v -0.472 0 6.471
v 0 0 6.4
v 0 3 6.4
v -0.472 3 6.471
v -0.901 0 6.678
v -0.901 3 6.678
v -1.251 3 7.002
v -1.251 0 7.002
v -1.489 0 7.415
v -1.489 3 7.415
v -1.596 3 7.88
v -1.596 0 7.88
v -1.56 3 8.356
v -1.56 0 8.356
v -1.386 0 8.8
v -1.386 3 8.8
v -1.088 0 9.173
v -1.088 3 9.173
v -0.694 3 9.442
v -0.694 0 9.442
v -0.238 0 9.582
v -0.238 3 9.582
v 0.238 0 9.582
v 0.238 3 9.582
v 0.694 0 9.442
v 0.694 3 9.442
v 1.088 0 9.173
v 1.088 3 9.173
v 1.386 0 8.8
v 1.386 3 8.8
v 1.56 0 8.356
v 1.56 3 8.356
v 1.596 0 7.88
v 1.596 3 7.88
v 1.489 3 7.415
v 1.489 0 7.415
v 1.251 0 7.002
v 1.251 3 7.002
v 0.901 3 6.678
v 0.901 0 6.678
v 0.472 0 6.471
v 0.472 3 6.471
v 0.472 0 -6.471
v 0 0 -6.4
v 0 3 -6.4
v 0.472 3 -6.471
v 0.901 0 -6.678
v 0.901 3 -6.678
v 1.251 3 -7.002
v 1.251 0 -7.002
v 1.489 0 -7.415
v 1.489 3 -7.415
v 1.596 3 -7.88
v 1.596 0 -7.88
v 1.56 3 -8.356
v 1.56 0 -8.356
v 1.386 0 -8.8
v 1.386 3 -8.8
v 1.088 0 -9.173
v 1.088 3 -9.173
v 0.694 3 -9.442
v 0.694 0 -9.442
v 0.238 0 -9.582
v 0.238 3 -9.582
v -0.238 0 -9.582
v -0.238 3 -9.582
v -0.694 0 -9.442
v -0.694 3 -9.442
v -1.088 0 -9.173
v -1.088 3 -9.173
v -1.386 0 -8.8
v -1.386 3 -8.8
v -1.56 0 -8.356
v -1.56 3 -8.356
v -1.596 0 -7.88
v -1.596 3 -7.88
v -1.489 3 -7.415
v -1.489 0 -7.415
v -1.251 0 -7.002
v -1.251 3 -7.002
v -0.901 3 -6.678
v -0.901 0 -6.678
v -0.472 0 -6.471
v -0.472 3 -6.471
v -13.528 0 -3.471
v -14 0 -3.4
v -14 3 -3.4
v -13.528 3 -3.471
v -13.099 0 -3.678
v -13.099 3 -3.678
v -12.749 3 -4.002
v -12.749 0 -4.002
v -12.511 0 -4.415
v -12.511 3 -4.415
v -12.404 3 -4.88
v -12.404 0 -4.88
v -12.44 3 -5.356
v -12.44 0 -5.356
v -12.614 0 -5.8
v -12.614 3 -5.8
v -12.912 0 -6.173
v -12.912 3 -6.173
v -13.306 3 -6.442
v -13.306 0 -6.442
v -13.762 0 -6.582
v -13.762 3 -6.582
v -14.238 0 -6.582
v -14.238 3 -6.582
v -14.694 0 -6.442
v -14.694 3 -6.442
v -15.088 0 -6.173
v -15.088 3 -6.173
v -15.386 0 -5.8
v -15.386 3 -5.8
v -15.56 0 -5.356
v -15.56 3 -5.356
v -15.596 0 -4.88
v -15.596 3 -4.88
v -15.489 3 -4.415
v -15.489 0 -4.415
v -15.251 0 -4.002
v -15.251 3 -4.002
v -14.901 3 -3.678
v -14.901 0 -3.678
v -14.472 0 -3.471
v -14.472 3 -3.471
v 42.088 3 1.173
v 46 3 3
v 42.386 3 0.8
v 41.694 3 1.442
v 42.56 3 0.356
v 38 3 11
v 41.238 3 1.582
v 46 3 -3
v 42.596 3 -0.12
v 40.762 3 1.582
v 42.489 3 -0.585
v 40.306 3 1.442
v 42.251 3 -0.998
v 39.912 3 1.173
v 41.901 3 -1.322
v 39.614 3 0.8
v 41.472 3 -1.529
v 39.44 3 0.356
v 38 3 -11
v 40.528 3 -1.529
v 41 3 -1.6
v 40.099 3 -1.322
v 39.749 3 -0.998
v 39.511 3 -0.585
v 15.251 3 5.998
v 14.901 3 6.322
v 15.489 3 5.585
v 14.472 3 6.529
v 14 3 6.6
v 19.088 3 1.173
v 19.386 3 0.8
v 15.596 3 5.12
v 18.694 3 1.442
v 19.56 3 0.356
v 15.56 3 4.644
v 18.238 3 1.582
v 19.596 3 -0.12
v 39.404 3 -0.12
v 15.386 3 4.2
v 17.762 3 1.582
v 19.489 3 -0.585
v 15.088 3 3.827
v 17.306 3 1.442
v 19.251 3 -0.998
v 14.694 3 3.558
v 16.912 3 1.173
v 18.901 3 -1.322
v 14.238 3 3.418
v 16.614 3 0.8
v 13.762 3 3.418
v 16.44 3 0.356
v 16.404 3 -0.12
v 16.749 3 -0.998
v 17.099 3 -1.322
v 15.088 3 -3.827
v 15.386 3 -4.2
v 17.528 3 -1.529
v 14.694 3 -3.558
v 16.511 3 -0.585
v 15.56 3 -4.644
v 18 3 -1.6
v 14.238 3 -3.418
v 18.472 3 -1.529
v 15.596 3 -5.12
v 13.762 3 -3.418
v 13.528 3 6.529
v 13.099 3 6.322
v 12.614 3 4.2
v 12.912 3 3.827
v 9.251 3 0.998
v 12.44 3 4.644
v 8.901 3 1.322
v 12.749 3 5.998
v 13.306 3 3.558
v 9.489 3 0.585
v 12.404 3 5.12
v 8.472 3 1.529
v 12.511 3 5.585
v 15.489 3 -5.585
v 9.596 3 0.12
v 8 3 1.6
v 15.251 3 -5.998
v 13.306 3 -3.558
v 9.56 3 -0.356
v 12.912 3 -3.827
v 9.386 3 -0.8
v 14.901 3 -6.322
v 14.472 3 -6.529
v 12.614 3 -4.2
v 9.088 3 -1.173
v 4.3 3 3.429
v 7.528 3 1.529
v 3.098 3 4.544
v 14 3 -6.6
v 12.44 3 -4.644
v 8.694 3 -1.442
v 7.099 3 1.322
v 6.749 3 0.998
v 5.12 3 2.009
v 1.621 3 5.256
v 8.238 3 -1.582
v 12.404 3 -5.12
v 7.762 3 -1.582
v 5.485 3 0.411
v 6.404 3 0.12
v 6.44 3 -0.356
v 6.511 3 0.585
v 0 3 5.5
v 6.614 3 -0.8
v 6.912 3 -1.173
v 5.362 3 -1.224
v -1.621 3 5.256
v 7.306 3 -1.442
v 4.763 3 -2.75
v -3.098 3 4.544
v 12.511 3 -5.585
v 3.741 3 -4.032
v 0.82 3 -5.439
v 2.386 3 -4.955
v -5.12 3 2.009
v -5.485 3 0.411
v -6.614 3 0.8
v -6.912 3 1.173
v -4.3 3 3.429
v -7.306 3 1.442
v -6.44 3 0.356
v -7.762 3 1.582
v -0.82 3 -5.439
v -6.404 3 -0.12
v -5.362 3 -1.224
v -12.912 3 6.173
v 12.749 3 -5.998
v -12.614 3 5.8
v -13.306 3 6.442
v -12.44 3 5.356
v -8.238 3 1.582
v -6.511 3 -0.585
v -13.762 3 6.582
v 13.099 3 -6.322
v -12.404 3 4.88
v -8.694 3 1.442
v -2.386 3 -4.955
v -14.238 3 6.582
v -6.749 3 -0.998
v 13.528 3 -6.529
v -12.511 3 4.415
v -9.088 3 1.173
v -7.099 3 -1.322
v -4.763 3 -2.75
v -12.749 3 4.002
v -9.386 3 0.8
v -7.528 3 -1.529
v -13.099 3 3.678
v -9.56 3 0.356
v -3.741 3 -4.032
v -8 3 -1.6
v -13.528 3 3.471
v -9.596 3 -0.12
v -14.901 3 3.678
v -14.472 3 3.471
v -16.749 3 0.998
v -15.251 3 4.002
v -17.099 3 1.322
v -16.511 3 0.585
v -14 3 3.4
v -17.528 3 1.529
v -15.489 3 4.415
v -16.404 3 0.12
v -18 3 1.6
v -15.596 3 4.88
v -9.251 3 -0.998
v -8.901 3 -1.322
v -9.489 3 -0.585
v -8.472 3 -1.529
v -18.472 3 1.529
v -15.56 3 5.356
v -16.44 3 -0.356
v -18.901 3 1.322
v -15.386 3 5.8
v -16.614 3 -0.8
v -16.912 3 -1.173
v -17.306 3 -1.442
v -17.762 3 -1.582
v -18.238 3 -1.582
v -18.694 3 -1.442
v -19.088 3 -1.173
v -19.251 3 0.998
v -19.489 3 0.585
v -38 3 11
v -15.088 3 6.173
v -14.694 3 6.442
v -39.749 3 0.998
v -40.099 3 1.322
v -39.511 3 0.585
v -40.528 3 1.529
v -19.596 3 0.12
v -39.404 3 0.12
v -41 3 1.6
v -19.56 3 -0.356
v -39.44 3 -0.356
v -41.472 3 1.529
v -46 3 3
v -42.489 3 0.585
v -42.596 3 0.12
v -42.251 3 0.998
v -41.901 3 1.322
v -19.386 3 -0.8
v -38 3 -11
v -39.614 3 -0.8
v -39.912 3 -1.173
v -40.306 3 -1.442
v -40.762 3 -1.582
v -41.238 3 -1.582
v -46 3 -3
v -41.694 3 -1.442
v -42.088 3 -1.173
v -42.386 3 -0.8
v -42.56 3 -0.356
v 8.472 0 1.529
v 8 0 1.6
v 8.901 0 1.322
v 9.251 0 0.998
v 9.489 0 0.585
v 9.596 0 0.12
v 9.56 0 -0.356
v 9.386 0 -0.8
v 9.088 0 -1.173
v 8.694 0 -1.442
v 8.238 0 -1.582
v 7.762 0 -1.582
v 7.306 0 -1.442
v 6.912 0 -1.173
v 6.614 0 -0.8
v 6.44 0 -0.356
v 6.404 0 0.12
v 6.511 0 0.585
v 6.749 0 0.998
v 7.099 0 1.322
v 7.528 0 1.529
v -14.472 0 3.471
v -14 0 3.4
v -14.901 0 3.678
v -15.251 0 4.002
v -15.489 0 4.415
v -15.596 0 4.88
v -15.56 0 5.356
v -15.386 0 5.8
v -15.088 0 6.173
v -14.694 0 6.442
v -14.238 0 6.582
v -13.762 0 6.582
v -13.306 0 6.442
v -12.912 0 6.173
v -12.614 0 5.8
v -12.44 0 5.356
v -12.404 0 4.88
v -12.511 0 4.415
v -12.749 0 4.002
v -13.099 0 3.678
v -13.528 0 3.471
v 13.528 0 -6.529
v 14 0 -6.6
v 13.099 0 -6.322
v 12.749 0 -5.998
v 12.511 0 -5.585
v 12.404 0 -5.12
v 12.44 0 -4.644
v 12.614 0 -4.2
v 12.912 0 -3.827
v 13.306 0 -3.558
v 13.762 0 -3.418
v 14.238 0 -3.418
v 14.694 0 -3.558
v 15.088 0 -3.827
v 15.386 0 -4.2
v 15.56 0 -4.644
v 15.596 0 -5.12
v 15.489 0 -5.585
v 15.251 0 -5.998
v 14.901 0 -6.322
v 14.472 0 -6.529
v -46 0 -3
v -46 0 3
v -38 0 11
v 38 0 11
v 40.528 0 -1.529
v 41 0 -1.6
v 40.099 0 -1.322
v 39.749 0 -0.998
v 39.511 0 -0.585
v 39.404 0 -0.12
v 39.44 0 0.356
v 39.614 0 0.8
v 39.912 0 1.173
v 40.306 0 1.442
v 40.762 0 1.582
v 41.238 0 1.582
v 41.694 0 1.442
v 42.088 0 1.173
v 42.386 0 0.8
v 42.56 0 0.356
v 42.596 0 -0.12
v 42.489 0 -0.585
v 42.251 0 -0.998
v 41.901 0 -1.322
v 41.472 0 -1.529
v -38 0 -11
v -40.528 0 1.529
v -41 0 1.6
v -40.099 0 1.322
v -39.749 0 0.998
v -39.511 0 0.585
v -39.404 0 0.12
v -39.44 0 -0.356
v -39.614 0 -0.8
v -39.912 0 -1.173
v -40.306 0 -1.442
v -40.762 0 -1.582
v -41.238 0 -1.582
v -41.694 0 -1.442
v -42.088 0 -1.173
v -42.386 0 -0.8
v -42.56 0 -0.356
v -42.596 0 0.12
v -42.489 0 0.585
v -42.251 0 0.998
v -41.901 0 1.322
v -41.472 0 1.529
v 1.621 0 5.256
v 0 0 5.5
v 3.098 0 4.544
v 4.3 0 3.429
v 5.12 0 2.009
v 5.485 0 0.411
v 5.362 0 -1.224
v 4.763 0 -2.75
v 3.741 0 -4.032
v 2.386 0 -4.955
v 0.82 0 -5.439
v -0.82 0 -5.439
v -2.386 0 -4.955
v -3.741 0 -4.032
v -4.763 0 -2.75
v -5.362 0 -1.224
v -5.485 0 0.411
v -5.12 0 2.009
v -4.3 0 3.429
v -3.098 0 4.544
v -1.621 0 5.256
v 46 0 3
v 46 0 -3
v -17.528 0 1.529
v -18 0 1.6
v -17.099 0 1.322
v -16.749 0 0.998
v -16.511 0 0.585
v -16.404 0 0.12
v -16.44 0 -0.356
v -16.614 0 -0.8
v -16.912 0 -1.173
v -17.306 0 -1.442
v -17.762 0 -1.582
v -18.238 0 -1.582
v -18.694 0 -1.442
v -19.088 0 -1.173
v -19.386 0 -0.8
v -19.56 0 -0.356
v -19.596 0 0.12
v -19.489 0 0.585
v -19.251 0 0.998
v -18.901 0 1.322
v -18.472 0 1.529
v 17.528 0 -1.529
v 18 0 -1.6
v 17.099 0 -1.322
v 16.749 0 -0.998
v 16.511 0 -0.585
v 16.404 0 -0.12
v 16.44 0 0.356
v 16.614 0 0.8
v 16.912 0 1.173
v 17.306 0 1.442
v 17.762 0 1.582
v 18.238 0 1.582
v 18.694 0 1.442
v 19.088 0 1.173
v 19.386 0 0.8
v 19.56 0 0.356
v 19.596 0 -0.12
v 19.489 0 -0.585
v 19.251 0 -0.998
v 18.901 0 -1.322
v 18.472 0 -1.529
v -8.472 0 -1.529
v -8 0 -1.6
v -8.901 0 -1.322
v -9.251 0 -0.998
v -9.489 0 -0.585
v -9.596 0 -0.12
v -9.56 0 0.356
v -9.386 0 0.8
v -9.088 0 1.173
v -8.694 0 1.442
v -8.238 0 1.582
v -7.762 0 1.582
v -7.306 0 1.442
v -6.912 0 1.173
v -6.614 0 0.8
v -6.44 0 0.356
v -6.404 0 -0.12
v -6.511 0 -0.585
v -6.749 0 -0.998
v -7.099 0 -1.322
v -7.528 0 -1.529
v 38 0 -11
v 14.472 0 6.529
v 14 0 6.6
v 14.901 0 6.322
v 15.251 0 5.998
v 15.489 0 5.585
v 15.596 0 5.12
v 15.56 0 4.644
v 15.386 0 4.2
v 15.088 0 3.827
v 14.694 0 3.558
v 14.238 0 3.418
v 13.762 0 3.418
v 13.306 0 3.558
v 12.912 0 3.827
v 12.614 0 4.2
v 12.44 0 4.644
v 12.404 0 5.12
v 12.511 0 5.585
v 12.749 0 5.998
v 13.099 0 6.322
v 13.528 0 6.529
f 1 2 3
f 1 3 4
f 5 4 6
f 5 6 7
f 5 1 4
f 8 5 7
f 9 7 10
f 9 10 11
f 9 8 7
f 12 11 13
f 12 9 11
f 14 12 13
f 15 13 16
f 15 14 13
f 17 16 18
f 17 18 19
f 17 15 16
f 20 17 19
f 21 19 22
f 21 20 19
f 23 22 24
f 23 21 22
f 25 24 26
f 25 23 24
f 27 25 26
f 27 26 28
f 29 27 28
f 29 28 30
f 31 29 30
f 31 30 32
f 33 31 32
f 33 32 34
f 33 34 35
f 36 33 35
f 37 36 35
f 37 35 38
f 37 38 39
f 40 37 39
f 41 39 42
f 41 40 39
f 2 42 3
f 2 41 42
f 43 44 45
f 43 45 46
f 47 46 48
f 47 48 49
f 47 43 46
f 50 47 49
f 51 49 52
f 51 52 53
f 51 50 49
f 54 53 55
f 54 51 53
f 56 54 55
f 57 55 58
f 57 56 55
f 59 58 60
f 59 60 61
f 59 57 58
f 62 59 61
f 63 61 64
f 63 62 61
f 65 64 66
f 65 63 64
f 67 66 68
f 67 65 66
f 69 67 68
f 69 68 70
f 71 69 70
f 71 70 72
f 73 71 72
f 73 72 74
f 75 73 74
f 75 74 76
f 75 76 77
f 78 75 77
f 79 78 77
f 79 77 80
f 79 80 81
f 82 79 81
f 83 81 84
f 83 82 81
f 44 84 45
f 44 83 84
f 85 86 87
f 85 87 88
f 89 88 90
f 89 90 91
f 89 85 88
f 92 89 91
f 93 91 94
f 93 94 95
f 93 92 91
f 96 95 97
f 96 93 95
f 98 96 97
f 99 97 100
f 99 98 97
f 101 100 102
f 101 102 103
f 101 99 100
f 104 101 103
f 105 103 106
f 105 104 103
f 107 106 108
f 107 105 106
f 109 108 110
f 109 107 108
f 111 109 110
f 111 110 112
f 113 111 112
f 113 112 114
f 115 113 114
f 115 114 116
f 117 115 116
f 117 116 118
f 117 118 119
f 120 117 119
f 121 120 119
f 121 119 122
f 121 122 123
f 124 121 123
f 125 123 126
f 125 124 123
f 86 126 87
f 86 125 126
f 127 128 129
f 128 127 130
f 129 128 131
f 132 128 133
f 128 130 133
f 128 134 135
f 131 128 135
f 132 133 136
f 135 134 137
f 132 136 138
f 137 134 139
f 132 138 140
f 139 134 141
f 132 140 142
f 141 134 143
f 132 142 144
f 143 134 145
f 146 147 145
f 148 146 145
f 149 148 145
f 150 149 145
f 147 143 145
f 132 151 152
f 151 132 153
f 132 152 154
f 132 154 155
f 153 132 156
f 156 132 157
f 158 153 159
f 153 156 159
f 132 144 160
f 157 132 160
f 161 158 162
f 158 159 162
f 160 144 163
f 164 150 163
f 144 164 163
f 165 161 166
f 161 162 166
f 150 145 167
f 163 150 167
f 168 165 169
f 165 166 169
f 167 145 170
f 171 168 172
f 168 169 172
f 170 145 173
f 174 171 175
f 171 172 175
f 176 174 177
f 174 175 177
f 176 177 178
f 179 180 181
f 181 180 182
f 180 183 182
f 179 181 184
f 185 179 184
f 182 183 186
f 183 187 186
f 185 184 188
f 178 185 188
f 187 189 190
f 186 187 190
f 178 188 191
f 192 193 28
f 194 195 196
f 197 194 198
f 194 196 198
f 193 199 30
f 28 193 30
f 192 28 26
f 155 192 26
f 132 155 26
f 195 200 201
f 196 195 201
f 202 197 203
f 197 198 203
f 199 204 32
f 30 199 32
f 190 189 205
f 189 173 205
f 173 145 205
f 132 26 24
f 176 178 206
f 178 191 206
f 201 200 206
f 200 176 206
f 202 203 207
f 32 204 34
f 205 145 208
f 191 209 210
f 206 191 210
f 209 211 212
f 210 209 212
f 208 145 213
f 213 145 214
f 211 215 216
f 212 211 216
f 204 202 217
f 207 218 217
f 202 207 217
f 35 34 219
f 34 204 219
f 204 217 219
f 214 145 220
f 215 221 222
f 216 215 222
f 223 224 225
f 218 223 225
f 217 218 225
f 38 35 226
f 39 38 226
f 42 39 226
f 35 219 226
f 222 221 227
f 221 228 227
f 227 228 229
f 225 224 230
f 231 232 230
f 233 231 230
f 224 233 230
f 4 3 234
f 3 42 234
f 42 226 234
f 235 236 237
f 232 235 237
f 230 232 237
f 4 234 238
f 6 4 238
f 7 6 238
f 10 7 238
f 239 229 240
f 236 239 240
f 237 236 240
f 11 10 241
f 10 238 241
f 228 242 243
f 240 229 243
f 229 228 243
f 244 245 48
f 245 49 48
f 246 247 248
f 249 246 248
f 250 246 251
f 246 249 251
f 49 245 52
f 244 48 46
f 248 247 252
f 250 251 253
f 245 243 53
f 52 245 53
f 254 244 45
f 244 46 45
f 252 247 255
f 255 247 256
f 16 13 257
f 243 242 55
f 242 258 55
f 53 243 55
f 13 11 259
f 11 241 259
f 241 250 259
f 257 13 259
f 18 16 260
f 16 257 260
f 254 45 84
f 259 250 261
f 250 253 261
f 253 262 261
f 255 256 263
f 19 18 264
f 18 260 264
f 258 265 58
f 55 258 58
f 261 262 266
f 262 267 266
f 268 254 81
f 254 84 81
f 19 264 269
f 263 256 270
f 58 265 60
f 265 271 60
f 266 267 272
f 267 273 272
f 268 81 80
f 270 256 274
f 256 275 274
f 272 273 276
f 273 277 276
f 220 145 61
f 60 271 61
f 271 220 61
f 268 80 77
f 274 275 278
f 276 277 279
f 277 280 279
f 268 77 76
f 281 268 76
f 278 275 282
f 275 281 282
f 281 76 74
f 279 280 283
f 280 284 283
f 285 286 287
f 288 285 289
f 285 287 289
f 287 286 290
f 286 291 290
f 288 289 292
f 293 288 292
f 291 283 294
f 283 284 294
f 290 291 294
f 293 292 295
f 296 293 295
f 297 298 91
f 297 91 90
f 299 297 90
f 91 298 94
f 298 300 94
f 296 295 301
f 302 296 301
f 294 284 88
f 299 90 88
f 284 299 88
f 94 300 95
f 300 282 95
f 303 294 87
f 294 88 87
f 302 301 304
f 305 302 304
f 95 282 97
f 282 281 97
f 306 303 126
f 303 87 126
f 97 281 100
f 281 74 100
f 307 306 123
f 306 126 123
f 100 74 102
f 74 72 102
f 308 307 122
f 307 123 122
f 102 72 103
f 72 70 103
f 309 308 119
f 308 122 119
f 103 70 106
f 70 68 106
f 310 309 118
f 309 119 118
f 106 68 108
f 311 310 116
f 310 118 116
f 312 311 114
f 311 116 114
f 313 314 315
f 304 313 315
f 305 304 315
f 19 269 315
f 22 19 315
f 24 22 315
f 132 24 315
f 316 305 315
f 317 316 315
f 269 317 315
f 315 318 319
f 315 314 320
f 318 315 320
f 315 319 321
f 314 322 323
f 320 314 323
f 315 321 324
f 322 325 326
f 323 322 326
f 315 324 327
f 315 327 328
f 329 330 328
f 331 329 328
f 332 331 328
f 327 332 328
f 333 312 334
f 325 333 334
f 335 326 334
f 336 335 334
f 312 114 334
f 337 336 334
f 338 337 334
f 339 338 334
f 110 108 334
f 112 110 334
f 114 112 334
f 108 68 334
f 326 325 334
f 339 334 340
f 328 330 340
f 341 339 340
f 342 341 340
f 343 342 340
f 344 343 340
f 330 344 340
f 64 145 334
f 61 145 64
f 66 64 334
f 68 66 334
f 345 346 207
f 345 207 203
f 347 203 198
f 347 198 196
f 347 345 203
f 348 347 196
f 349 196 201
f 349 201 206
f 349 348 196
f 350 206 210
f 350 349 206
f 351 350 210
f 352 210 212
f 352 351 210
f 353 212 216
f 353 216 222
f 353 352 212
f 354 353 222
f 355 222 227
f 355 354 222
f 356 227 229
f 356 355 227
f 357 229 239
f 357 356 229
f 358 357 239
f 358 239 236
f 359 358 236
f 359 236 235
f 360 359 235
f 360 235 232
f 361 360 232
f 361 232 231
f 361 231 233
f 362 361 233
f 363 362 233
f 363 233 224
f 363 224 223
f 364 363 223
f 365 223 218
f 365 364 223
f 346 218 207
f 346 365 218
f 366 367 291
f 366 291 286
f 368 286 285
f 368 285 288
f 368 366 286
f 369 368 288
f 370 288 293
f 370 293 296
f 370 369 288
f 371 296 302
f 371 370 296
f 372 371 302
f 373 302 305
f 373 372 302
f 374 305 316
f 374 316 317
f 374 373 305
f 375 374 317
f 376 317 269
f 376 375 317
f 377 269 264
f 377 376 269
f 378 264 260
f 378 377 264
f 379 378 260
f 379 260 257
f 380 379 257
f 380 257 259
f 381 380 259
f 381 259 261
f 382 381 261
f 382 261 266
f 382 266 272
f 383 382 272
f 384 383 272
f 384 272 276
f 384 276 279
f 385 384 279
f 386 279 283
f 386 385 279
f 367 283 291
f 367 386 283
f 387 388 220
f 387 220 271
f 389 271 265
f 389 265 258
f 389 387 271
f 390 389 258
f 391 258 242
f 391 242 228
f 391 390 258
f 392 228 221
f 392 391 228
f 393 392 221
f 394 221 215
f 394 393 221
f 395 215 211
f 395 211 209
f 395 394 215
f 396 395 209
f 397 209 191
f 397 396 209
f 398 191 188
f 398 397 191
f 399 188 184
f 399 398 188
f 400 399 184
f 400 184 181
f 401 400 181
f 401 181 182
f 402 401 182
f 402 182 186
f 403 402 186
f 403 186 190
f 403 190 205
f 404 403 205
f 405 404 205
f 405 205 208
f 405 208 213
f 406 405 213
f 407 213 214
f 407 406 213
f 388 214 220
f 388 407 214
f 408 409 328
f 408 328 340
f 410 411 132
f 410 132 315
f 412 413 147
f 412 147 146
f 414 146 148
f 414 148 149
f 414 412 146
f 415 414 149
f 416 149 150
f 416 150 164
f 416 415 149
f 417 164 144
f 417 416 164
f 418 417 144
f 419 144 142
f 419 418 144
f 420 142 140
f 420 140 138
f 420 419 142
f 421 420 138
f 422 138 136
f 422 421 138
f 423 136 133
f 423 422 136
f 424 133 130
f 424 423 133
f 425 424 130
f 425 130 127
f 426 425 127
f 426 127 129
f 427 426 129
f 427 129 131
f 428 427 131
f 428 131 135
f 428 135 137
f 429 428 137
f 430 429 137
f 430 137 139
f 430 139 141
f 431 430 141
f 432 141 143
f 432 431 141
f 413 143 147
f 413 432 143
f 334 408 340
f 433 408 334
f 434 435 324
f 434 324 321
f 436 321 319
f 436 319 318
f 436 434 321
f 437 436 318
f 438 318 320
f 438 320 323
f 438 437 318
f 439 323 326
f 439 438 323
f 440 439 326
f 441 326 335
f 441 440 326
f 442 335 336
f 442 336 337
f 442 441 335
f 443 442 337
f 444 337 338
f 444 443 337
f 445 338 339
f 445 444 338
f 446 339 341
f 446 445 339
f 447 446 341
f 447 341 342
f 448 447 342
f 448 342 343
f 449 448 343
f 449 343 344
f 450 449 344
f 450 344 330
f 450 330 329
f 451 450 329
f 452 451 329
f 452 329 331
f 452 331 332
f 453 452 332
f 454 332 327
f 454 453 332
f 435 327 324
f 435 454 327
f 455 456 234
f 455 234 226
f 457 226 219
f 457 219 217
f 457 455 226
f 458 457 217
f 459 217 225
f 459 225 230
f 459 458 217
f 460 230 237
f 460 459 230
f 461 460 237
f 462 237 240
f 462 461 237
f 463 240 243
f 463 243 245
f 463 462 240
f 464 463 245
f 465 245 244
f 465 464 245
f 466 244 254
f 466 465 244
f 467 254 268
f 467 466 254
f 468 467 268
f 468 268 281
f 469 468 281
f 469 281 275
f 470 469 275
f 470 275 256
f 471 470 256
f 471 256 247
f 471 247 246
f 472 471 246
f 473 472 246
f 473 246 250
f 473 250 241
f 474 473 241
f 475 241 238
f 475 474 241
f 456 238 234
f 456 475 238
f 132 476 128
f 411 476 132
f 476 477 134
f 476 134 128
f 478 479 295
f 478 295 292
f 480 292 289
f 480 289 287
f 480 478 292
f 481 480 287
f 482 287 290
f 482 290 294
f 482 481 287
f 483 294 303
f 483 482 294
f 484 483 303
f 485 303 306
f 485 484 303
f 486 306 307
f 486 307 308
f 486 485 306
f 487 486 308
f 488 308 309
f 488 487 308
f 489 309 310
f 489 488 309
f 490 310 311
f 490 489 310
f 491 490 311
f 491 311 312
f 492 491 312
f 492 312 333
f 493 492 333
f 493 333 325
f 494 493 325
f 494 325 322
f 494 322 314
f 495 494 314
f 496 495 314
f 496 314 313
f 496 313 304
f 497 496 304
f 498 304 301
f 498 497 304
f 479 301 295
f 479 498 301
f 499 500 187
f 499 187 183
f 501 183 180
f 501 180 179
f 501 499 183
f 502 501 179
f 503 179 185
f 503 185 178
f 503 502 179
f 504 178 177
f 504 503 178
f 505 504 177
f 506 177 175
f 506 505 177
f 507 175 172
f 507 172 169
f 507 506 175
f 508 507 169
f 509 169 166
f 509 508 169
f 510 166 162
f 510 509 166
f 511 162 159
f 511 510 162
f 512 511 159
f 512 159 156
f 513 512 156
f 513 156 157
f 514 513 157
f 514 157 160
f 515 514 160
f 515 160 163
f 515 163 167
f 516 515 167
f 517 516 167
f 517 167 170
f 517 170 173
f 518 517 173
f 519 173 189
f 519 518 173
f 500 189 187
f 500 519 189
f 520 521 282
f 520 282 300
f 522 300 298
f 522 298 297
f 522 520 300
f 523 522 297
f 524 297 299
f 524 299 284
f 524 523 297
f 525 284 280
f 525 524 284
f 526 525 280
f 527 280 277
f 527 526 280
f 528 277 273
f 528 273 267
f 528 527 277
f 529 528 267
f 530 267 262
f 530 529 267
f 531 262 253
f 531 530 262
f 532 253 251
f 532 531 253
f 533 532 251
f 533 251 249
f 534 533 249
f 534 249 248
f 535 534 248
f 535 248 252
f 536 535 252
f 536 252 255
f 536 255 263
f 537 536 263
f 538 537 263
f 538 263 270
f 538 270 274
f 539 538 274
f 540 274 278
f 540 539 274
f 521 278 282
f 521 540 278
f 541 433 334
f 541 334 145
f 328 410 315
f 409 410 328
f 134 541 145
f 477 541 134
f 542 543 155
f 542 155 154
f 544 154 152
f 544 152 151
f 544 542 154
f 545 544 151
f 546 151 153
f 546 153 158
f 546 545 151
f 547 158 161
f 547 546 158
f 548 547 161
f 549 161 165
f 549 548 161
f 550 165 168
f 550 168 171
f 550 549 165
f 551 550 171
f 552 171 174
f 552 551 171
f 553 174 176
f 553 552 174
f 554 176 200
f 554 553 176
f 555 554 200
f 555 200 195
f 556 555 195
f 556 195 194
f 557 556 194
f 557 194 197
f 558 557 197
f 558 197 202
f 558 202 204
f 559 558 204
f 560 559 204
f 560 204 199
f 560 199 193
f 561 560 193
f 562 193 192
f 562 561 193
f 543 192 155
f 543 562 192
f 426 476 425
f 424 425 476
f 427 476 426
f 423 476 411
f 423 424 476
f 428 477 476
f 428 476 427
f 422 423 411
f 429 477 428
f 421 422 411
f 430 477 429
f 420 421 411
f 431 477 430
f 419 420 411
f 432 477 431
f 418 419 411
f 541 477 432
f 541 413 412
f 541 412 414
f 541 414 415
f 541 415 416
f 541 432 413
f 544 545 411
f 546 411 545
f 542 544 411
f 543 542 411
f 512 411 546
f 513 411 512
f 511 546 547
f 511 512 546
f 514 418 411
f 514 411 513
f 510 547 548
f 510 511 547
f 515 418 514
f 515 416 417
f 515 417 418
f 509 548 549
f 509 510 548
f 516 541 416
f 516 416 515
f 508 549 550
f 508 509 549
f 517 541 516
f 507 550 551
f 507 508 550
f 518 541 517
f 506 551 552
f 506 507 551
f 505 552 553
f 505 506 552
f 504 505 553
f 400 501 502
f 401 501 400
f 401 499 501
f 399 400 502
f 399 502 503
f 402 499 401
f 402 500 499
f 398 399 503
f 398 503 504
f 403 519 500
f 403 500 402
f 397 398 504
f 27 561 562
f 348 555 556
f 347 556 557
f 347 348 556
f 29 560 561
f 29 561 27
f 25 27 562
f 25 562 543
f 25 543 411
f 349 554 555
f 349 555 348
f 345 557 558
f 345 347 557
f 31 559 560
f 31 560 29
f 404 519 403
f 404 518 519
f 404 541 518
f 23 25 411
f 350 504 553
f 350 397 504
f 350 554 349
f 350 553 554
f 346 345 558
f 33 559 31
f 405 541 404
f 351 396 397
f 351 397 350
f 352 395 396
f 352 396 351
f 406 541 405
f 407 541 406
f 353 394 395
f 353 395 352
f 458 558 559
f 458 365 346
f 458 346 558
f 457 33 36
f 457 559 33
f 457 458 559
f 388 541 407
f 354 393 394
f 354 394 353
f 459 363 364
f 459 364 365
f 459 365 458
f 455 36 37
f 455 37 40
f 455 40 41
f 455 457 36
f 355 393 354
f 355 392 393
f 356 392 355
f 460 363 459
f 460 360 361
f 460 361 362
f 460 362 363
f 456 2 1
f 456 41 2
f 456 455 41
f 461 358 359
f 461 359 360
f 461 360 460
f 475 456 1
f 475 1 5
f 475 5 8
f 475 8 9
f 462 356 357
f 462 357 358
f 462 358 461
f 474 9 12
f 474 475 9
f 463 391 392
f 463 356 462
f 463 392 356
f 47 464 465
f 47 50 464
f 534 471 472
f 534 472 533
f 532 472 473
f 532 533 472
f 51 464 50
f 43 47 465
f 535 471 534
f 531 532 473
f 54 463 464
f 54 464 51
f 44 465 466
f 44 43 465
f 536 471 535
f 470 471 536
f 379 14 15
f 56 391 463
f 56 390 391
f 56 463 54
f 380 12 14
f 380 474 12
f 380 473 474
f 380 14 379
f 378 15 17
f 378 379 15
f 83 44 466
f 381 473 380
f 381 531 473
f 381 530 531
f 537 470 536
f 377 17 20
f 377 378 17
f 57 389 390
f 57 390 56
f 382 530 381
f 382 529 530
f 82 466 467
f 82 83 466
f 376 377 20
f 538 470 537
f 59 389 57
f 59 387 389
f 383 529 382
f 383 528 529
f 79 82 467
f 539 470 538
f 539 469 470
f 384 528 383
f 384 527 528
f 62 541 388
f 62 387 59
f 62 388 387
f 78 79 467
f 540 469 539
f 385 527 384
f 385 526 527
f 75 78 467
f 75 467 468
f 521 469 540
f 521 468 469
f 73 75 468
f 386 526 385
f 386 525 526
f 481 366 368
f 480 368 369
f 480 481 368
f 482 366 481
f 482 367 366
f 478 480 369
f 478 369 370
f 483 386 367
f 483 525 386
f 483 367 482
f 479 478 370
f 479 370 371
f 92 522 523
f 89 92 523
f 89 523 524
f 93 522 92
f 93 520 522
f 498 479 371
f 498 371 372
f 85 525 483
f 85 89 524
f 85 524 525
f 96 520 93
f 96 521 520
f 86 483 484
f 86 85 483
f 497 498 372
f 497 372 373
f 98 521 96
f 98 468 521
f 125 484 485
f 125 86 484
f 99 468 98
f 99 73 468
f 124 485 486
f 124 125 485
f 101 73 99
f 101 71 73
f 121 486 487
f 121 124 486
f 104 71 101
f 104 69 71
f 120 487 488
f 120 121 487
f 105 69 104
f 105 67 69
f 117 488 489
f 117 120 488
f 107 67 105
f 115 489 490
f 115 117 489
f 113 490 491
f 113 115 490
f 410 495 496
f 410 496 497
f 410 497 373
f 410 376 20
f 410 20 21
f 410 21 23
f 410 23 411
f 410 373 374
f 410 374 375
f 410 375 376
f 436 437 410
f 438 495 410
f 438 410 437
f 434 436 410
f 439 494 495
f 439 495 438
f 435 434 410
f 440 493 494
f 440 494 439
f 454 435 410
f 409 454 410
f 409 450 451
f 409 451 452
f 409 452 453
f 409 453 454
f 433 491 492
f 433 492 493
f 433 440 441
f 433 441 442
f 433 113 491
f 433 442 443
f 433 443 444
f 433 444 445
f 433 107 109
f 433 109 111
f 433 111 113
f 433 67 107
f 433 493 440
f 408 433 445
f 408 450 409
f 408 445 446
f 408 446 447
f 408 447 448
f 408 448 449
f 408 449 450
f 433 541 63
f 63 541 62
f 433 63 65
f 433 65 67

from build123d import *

# Parameters (mm, degrees)
SKETCH_1_R      = 1.6
SKETCH_1_R_2    = 5.5
EXTRUDE_1_DEPTH = 3


with BuildPart() as part:
    # 草图1 → 凸台-拉伸1 (new body)
    with BuildSketch(Plane(origin=(0, 0, 0), x_dir=(1, 0, 0), z_dir=(0, 1, 0))):
        Polygon((-46, 3), (-38, 11), (38, 11), (46, 3), (46, -3), (38, -11), (-38, -11), (-46, -3), align=None)
        with Locations(Location((0, 8, 0), (0, 0, 270))):
            Circle(SKETCH_1_R, mode=Mode.SUBTRACT)
        with Locations(Location((8, 0, 0), (0, 0, 270))):
            Circle(SKETCH_1_R, mode=Mode.SUBTRACT)
        with Locations(Location((-8, 0, 0), (0, 0, 90))):
            Circle(SKETCH_1_R, mode=Mode.SUBTRACT)
        with Locations(Location((0, 0, 0), (0, 0, 270))):
            Circle(SKETCH_1_R_2, mode=Mode.SUBTRACT)
        with Locations(Location((0, -8, 0), (0, 0, 90))):
            Circle(SKETCH_1_R, mode=Mode.SUBTRACT)
        with Locations(Location((-18, 0, 0), (0, 0, 270))):
            Circle(SKETCH_1_R, mode=Mode.SUBTRACT)
        with Locations(Location((-14, 5, 0), (0, 0, 270))):
            Circle(SKETCH_1_R, mode=Mode.SUBTRACT)
        with Locations(Location((-14, -5, 0), (0, 0, 90))):
            Circle(SKETCH_1_R, mode=Mode.SUBTRACT)
        with Locations(Location((14, -5, 0), (0, 0, 270))):
            Circle(SKETCH_1_R, mode=Mode.SUBTRACT)
        with Locations(Location((18, 0, 0), (0, 0, 90))):
            Circle(SKETCH_1_R, mode=Mode.SUBTRACT)
        with Locations(Location((14, 5, 0), (0, 0, 90))):
            Circle(SKETCH_1_R, mode=Mode.SUBTRACT)
        with Locations(Location((-41, 0, 0), (0, 0, 270))):
            Circle(SKETCH_1_R, mode=Mode.SUBTRACT)
        with Locations(Location((41, 0, 0), (0, 0, 90))):
            Circle(SKETCH_1_R, mode=Mode.SUBTRACT)
    extrude(amount=EXTRUDE_1_DEPTH)


solid = part.part
